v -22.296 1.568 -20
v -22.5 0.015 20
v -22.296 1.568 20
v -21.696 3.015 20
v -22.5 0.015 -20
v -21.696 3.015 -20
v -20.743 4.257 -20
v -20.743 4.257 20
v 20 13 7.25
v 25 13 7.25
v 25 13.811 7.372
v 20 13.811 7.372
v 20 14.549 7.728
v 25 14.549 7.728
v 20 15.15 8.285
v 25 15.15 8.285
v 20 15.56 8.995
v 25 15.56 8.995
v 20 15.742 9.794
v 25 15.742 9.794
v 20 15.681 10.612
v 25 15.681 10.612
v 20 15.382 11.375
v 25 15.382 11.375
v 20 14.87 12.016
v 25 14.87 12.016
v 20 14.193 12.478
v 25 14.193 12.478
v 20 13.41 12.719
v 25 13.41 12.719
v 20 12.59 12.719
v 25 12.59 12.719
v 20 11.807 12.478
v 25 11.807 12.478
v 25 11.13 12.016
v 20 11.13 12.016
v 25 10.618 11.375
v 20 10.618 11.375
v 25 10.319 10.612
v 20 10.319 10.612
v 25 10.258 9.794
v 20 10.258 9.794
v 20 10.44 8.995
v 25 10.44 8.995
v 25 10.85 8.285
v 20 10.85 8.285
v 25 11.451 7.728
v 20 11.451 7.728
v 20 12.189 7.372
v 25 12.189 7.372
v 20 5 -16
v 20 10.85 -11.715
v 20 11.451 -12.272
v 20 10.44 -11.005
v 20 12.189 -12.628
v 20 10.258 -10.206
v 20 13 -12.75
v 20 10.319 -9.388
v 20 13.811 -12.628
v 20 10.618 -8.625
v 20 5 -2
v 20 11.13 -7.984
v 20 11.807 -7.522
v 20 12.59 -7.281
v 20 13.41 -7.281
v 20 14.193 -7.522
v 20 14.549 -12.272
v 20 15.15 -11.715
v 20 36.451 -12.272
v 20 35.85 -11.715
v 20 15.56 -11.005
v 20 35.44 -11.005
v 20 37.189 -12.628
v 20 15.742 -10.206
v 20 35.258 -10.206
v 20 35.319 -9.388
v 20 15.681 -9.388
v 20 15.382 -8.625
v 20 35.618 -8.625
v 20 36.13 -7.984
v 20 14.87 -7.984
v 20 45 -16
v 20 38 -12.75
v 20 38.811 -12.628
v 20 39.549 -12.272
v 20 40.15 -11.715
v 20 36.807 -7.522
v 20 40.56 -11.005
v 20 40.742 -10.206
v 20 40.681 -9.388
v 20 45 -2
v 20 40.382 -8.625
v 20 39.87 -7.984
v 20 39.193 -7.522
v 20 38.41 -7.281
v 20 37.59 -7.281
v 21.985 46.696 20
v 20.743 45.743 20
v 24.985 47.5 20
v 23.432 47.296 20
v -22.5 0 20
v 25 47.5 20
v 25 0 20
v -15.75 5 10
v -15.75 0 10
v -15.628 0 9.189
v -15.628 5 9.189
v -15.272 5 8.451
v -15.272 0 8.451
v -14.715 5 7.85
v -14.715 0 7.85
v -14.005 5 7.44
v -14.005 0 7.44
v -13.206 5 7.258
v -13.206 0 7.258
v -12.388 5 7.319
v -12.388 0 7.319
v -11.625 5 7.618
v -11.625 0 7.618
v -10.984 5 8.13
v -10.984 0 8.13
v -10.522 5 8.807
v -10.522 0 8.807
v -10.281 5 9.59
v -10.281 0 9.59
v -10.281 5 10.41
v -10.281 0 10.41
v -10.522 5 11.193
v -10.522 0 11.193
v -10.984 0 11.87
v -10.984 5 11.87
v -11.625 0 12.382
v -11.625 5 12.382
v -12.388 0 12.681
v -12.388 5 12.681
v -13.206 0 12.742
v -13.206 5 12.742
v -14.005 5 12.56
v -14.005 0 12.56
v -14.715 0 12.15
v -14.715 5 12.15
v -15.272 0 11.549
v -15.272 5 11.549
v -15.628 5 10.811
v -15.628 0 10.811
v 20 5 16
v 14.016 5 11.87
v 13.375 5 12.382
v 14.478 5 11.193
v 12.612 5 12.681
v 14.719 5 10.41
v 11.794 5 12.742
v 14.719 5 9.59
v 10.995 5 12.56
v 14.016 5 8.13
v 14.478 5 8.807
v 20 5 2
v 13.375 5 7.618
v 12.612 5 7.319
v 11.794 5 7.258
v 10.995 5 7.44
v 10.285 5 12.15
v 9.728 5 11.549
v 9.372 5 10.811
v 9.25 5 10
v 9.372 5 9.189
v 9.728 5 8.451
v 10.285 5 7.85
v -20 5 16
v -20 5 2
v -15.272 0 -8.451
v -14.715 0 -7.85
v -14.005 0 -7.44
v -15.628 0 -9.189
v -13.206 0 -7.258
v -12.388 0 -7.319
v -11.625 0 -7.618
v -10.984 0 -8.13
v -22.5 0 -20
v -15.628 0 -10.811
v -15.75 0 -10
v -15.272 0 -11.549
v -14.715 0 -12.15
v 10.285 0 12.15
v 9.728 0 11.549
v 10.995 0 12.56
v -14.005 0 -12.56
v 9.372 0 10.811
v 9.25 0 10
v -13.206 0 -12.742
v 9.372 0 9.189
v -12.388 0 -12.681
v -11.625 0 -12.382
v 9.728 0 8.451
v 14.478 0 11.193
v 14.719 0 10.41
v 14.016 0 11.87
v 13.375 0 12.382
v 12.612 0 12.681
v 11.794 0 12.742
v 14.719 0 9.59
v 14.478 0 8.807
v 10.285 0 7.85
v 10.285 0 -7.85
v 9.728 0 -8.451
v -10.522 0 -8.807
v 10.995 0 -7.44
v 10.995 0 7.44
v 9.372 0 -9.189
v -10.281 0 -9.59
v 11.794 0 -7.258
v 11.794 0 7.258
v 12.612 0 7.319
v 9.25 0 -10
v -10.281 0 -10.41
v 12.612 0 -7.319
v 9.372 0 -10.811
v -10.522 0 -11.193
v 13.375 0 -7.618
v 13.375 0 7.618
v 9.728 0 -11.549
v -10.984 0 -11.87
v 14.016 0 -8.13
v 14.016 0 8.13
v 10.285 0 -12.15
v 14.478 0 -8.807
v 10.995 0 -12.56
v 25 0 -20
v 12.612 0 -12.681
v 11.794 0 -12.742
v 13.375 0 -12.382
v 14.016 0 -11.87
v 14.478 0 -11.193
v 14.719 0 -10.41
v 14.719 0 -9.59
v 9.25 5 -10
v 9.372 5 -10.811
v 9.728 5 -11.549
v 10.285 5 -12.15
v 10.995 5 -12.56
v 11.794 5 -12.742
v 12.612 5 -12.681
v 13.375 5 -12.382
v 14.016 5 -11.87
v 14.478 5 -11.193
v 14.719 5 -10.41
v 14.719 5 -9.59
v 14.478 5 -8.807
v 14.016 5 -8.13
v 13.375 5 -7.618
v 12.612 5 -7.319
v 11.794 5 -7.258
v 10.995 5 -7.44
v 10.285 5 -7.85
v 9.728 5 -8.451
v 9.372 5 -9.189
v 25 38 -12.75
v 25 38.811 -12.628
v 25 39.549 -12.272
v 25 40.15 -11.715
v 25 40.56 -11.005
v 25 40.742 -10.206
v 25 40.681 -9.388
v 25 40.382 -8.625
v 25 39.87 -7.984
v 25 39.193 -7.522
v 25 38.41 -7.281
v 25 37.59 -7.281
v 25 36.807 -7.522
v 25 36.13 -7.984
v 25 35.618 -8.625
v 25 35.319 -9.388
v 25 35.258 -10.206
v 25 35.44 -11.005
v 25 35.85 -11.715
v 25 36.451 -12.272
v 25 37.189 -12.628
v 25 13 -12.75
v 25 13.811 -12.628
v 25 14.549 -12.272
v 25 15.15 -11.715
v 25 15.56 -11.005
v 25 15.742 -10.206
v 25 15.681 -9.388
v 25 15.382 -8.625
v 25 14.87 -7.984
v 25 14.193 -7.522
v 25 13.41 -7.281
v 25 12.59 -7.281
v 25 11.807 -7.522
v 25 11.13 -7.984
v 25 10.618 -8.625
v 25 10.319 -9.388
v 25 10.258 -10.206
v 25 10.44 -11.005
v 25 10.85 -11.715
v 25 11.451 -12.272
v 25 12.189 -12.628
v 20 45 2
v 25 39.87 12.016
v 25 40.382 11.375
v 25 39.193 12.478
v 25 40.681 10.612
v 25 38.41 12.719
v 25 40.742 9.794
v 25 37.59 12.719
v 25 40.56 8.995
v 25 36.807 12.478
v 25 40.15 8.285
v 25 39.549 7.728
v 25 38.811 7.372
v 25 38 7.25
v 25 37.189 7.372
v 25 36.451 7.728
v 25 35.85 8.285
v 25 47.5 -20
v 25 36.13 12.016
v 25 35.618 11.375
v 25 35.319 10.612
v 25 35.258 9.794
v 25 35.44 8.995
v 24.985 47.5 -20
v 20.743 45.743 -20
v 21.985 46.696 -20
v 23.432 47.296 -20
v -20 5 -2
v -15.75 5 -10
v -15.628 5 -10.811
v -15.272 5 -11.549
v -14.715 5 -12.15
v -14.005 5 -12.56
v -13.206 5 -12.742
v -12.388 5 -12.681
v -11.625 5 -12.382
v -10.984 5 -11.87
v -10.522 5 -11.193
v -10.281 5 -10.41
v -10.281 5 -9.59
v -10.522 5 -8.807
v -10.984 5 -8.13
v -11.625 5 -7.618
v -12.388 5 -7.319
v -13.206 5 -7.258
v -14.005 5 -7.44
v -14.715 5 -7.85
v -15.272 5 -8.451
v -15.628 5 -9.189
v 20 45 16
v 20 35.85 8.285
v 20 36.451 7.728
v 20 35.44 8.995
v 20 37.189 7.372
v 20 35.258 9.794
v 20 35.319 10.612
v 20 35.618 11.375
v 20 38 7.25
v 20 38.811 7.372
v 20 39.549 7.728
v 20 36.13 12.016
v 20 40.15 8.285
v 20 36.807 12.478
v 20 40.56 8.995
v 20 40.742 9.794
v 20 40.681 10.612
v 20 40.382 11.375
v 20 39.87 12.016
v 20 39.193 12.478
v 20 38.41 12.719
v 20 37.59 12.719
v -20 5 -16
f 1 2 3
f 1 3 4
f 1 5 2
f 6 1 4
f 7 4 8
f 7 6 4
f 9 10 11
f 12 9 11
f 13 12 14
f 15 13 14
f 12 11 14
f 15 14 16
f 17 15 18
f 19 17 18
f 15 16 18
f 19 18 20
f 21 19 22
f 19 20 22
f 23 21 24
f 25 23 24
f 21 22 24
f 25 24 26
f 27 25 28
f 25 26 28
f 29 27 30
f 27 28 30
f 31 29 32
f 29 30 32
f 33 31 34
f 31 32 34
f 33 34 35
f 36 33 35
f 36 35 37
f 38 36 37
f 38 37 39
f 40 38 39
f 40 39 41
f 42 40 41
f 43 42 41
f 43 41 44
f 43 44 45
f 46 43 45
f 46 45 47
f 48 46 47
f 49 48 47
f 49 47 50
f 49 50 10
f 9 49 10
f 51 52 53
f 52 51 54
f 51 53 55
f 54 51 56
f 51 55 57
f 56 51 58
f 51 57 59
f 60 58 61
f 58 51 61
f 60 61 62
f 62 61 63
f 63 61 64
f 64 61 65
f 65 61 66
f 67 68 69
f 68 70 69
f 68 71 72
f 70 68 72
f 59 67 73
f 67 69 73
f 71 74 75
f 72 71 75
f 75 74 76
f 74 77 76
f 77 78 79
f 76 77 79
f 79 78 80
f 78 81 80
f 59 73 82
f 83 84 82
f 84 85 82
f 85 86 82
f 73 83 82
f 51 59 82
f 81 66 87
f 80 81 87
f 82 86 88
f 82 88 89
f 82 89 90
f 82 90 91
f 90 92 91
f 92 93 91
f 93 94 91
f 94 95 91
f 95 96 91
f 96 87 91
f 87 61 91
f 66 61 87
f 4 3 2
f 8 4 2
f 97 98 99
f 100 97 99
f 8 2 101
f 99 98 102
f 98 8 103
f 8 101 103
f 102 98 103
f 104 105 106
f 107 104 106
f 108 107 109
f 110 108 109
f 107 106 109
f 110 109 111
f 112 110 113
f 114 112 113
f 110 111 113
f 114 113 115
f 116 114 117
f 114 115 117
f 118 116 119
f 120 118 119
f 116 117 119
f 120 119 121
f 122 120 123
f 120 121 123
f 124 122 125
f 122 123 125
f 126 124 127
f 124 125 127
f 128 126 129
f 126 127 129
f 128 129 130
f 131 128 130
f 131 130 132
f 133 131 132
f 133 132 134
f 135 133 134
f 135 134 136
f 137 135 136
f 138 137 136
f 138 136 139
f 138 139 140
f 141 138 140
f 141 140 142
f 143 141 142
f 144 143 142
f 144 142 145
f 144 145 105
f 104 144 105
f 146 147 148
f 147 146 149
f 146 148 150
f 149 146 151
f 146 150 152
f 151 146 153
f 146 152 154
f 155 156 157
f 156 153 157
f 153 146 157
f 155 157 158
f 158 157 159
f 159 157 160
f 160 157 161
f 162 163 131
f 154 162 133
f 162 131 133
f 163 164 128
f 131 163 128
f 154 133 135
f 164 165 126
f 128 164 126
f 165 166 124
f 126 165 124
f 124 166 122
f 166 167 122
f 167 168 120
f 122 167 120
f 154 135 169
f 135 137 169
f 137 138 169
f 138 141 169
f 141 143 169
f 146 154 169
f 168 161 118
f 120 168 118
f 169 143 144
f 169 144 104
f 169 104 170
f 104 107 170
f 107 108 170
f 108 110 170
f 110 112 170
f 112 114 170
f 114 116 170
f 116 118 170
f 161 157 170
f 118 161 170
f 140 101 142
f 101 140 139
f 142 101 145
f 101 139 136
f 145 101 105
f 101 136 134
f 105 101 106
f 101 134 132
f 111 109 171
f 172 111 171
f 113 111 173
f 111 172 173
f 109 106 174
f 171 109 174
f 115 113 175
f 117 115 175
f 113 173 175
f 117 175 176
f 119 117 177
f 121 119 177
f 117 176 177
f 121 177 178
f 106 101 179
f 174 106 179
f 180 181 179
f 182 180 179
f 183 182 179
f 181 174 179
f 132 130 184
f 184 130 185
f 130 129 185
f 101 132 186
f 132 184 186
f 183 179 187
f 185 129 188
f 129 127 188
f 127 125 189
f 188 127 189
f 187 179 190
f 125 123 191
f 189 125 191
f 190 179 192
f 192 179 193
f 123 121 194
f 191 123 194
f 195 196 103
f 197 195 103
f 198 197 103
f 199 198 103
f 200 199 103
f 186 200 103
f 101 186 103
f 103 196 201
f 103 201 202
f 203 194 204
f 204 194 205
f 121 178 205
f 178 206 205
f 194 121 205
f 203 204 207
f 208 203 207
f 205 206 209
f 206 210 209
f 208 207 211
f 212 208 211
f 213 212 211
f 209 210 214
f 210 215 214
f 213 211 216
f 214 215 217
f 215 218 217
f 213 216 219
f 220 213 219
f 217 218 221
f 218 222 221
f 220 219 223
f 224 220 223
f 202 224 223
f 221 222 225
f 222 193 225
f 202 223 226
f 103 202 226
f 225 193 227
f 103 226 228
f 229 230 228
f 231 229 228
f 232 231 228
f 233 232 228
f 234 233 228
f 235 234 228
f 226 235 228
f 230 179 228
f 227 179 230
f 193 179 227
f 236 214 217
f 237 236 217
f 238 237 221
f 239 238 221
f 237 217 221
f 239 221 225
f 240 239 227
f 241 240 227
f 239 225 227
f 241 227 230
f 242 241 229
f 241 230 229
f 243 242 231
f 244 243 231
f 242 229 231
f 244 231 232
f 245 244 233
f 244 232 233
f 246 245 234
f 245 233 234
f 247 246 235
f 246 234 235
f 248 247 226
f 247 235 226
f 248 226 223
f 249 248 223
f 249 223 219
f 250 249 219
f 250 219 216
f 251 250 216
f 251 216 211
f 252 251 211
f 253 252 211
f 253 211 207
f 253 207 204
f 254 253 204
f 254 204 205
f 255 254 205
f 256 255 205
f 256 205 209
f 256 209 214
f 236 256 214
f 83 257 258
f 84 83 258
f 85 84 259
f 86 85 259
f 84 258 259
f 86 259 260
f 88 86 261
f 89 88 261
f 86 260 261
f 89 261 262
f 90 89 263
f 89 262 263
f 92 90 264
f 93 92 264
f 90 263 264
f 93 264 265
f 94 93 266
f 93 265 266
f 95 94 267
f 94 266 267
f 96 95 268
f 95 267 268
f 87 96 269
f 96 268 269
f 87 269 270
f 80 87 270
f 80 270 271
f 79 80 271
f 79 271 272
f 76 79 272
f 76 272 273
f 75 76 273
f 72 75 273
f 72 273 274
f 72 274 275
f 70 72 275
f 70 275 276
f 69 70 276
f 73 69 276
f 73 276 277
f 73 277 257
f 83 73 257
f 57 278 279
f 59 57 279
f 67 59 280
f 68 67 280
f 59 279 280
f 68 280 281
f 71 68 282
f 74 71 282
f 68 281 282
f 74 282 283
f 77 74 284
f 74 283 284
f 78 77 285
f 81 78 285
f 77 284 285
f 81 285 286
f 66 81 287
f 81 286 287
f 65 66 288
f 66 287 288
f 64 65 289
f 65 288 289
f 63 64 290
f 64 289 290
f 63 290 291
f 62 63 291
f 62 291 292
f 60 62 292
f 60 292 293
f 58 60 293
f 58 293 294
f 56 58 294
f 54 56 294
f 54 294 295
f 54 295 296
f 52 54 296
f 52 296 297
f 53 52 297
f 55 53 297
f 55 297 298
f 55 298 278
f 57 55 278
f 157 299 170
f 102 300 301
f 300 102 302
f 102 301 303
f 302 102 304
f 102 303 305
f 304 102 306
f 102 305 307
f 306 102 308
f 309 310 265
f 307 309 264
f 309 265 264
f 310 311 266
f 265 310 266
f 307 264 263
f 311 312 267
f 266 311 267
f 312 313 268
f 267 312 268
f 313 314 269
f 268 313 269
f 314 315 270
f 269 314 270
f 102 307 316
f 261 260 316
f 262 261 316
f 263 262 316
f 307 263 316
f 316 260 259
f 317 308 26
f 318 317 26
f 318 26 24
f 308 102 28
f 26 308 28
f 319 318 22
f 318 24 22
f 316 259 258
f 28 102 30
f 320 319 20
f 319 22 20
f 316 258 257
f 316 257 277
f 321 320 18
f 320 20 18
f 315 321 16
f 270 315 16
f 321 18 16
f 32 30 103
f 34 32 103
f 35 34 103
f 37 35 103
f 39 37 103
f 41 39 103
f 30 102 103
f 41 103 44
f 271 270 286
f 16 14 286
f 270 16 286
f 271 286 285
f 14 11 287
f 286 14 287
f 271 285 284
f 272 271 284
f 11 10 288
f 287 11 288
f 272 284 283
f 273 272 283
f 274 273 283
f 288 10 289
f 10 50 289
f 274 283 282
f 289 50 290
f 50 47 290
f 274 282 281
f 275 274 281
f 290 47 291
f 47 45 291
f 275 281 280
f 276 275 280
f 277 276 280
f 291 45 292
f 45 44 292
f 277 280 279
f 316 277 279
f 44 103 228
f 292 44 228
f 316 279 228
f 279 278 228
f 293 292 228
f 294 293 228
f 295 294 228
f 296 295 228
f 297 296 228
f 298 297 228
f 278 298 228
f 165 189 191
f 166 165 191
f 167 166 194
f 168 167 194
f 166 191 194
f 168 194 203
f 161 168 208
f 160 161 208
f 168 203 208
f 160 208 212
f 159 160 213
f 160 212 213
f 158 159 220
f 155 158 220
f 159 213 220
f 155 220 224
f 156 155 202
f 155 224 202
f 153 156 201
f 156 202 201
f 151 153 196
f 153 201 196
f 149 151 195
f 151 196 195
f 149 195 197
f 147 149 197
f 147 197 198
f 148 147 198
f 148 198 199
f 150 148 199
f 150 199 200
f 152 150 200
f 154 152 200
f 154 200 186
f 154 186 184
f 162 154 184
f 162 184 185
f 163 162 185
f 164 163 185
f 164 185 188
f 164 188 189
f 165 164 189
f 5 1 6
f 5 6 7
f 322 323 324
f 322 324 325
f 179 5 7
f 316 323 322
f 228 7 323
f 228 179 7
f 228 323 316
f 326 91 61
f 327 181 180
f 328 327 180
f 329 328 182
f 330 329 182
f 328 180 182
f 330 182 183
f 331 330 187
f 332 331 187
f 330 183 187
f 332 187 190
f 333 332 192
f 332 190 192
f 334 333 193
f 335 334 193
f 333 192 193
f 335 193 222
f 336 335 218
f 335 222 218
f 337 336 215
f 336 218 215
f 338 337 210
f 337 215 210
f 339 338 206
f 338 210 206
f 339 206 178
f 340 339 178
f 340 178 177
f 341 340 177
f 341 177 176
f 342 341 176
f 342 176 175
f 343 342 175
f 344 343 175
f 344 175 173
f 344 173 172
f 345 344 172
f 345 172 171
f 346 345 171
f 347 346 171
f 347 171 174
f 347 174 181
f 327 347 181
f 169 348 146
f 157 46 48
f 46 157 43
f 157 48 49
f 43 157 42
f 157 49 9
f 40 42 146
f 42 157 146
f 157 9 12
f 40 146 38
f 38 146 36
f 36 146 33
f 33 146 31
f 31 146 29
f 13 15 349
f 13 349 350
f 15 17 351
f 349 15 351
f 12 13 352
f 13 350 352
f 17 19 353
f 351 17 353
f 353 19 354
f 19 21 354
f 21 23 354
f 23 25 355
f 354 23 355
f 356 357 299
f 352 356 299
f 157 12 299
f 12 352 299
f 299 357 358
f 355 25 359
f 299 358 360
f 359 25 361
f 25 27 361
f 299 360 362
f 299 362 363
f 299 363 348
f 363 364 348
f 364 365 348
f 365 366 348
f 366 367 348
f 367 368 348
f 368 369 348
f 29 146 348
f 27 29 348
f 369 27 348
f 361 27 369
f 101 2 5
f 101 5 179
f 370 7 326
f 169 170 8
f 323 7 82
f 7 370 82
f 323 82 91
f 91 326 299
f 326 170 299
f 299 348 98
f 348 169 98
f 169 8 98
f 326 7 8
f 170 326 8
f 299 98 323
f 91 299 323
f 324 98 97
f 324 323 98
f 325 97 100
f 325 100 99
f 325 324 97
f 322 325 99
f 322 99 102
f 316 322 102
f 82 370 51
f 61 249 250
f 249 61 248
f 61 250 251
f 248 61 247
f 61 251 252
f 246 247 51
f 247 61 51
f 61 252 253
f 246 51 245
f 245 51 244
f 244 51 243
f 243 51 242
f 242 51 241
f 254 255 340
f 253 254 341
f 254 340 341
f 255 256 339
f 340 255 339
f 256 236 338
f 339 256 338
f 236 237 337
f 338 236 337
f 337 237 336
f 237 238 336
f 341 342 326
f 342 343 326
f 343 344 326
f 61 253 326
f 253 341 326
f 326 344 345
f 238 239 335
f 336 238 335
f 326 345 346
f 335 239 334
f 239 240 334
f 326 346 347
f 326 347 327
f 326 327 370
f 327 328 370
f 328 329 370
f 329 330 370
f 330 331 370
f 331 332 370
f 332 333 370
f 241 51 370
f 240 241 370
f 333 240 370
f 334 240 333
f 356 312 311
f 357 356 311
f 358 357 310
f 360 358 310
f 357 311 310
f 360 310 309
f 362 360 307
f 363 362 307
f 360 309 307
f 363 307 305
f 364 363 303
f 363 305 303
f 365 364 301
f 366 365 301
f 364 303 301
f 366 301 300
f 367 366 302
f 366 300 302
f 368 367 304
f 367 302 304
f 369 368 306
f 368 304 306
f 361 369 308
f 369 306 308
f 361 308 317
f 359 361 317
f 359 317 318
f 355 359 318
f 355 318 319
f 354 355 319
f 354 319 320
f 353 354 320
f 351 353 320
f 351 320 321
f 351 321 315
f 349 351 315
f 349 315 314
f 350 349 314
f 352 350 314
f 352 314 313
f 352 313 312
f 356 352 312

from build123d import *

# Parameters (mm, degrees)
SKETCH1_W                = 50
SKETCH1_H                = 40
BOSS_EXTRUDE1_DEPTH      = 50
CUT_EXTRUDE1_DEPTH       = 69.738635424
SHELL1_T                 = -5
M5_CLEARANCE_HOLE1_D     = 5.5
M5_CLEARANCE_HOLE1_DEPTH = 12
M5_CLEARANCE_HOLE1_TIP   = 1.652366702
CUT_EXTRUDE2_DEPTH       = 1
CUT_EXTRUDE3_DEPTH       = 1
CUT_EXTRUDE4_DEPTH       = 69.738635424
FILLET2_R                = 6
M5_CLEARANCE_HOLE2_D     = 5.5
M5_CLEARANCE_HOLE2_DEPTH = 12
M5_CLEARANCE_HOLE2_TIP   = 1.652366702
BOSS_EXTRUDE2_DEPTH      = 2
BOSS_EXTRUDE2_DEPTH_BACK = 2


with BuildPart() as part:
    # Sketch1 → Boss-Extrude1 (new body)
    with BuildSketch(Plane(origin=(0, 0, 0), x_dir=(1, 0, 0), z_dir=(0, 1, 0))):
        Rectangle(SKETCH1_W, SKETCH1_H)
    extrude(amount=BOSS_EXTRUDE1_DEPTH)

    # Sketch2 → Cut-Extrude1 (cut, through all)
    with BuildSketch(Plane.XY.offset(20)):
        Polygon((-25, 0), (25, 50), (-25, 50), align=None)
    extrude(amount=-CUT_EXTRUDE1_DEPTH, mode=Mode.SUBTRACT)

    # Shell1
    shell1_openings = [part.faces().sort_by_distance(p)[0] for p in [
        (0, 25, 0),
    ]]
    offset(amount=SHELL1_T, openings=shell1_openings, kind=Kind.INTERSECTION)

    # M5 Clearance Hole1
    with Locations(Plane.ZY.offset(-20)):
        with Locations((-10, 38), (-10, 13), (10, 13), (10, 38)):
            Hole(M5_CLEARANCE_HOLE1_D / 2, depth=M5_CLEARANCE_HOLE1_DEPTH)
            with Locations((0, 0, -(M5_CLEARANCE_HOLE1_DEPTH + M5_CLEARANCE_HOLE1_TIP / 2))):  # 118° drill point
                Cone(0, M5_CLEARANCE_HOLE1_D / 2, M5_CLEARANCE_HOLE1_TIP, mode=Mode.SUBTRACT)

    # Sketch5 → Cut-Extrude2 (cut)
    with BuildSketch(Plane.XY.offset(-15)):
        Polygon((-20, 5), (20, 5), (20, 45), align=None)
    extrude(amount=-CUT_EXTRUDE2_DEPTH, mode=Mode.SUBTRACT)

    # Sketch6 → Cut-Extrude3 (cut)
    with BuildSketch(Plane(origin=(0, 0, 15), x_dir=(-1, 0, 0), z_dir=(0, 0, -1))):
        Polygon((-20, 45), (-20, 5), (20, 5), align=None)
    extrude(amount=-CUT_EXTRUDE3_DEPTH, mode=Mode.SUBTRACT)

    # Sketch7 → Cut-Extrude4 (cut, through all)
    with BuildSketch(Plane.XY.offset(20)):
        Polygon((-22.5, 2.5), (-22.5, 0), (-25, 0), align=None)
        Polygon((22.5, 47.5), (25, 47.5), (25, 50), align=None)
    extrude(amount=-CUT_EXTRUDE4_DEPTH, mode=Mode.SUBTRACT)

    # Fillet2
    fillet2_edges = [part.edges().sort_by_distance(p)[0] for p in [
        (-22.5, 2.5, 0),
        (22.5, 47.5, 0),
    ]]
    fillet(fillet2_edges, radius=FILLET2_R)

    # M5 Clearance Hole2
    with Locations(Plane(origin=(0, 5, 0), x_dir=(1, 0, 0), z_dir=(0, 1, 0))):
        with Locations((12, 10), (12, -10), (-13, 10), (-13, -10)):
            Hole(M5_CLEARANCE_HOLE2_D / 2, depth=M5_CLEARANCE_HOLE2_DEPTH)
            with Locations((0, 0, -(M5_CLEARANCE_HOLE2_DEPTH + M5_CLEARANCE_HOLE2_TIP / 2))):  # 118° drill point
                Cone(0, M5_CLEARANCE_HOLE2_D / 2, M5_CLEARANCE_HOLE2_TIP, mode=Mode.SUBTRACT)

    # Sketch10 → Boss-Extrude2 (add, two sides: drawn at the far end of the back side and taken through both)
    with BuildSketch(Plane.XY.offset(-BOSS_EXTRUDE2_DEPTH_BACK)):
        Polygon((20, 45), (20, 5), (-20, 5), align=None)
    extrude(amount=BOSS_EXTRUDE2_DEPTH + BOSS_EXTRUDE2_DEPTH_BACK)


solid = part.part
